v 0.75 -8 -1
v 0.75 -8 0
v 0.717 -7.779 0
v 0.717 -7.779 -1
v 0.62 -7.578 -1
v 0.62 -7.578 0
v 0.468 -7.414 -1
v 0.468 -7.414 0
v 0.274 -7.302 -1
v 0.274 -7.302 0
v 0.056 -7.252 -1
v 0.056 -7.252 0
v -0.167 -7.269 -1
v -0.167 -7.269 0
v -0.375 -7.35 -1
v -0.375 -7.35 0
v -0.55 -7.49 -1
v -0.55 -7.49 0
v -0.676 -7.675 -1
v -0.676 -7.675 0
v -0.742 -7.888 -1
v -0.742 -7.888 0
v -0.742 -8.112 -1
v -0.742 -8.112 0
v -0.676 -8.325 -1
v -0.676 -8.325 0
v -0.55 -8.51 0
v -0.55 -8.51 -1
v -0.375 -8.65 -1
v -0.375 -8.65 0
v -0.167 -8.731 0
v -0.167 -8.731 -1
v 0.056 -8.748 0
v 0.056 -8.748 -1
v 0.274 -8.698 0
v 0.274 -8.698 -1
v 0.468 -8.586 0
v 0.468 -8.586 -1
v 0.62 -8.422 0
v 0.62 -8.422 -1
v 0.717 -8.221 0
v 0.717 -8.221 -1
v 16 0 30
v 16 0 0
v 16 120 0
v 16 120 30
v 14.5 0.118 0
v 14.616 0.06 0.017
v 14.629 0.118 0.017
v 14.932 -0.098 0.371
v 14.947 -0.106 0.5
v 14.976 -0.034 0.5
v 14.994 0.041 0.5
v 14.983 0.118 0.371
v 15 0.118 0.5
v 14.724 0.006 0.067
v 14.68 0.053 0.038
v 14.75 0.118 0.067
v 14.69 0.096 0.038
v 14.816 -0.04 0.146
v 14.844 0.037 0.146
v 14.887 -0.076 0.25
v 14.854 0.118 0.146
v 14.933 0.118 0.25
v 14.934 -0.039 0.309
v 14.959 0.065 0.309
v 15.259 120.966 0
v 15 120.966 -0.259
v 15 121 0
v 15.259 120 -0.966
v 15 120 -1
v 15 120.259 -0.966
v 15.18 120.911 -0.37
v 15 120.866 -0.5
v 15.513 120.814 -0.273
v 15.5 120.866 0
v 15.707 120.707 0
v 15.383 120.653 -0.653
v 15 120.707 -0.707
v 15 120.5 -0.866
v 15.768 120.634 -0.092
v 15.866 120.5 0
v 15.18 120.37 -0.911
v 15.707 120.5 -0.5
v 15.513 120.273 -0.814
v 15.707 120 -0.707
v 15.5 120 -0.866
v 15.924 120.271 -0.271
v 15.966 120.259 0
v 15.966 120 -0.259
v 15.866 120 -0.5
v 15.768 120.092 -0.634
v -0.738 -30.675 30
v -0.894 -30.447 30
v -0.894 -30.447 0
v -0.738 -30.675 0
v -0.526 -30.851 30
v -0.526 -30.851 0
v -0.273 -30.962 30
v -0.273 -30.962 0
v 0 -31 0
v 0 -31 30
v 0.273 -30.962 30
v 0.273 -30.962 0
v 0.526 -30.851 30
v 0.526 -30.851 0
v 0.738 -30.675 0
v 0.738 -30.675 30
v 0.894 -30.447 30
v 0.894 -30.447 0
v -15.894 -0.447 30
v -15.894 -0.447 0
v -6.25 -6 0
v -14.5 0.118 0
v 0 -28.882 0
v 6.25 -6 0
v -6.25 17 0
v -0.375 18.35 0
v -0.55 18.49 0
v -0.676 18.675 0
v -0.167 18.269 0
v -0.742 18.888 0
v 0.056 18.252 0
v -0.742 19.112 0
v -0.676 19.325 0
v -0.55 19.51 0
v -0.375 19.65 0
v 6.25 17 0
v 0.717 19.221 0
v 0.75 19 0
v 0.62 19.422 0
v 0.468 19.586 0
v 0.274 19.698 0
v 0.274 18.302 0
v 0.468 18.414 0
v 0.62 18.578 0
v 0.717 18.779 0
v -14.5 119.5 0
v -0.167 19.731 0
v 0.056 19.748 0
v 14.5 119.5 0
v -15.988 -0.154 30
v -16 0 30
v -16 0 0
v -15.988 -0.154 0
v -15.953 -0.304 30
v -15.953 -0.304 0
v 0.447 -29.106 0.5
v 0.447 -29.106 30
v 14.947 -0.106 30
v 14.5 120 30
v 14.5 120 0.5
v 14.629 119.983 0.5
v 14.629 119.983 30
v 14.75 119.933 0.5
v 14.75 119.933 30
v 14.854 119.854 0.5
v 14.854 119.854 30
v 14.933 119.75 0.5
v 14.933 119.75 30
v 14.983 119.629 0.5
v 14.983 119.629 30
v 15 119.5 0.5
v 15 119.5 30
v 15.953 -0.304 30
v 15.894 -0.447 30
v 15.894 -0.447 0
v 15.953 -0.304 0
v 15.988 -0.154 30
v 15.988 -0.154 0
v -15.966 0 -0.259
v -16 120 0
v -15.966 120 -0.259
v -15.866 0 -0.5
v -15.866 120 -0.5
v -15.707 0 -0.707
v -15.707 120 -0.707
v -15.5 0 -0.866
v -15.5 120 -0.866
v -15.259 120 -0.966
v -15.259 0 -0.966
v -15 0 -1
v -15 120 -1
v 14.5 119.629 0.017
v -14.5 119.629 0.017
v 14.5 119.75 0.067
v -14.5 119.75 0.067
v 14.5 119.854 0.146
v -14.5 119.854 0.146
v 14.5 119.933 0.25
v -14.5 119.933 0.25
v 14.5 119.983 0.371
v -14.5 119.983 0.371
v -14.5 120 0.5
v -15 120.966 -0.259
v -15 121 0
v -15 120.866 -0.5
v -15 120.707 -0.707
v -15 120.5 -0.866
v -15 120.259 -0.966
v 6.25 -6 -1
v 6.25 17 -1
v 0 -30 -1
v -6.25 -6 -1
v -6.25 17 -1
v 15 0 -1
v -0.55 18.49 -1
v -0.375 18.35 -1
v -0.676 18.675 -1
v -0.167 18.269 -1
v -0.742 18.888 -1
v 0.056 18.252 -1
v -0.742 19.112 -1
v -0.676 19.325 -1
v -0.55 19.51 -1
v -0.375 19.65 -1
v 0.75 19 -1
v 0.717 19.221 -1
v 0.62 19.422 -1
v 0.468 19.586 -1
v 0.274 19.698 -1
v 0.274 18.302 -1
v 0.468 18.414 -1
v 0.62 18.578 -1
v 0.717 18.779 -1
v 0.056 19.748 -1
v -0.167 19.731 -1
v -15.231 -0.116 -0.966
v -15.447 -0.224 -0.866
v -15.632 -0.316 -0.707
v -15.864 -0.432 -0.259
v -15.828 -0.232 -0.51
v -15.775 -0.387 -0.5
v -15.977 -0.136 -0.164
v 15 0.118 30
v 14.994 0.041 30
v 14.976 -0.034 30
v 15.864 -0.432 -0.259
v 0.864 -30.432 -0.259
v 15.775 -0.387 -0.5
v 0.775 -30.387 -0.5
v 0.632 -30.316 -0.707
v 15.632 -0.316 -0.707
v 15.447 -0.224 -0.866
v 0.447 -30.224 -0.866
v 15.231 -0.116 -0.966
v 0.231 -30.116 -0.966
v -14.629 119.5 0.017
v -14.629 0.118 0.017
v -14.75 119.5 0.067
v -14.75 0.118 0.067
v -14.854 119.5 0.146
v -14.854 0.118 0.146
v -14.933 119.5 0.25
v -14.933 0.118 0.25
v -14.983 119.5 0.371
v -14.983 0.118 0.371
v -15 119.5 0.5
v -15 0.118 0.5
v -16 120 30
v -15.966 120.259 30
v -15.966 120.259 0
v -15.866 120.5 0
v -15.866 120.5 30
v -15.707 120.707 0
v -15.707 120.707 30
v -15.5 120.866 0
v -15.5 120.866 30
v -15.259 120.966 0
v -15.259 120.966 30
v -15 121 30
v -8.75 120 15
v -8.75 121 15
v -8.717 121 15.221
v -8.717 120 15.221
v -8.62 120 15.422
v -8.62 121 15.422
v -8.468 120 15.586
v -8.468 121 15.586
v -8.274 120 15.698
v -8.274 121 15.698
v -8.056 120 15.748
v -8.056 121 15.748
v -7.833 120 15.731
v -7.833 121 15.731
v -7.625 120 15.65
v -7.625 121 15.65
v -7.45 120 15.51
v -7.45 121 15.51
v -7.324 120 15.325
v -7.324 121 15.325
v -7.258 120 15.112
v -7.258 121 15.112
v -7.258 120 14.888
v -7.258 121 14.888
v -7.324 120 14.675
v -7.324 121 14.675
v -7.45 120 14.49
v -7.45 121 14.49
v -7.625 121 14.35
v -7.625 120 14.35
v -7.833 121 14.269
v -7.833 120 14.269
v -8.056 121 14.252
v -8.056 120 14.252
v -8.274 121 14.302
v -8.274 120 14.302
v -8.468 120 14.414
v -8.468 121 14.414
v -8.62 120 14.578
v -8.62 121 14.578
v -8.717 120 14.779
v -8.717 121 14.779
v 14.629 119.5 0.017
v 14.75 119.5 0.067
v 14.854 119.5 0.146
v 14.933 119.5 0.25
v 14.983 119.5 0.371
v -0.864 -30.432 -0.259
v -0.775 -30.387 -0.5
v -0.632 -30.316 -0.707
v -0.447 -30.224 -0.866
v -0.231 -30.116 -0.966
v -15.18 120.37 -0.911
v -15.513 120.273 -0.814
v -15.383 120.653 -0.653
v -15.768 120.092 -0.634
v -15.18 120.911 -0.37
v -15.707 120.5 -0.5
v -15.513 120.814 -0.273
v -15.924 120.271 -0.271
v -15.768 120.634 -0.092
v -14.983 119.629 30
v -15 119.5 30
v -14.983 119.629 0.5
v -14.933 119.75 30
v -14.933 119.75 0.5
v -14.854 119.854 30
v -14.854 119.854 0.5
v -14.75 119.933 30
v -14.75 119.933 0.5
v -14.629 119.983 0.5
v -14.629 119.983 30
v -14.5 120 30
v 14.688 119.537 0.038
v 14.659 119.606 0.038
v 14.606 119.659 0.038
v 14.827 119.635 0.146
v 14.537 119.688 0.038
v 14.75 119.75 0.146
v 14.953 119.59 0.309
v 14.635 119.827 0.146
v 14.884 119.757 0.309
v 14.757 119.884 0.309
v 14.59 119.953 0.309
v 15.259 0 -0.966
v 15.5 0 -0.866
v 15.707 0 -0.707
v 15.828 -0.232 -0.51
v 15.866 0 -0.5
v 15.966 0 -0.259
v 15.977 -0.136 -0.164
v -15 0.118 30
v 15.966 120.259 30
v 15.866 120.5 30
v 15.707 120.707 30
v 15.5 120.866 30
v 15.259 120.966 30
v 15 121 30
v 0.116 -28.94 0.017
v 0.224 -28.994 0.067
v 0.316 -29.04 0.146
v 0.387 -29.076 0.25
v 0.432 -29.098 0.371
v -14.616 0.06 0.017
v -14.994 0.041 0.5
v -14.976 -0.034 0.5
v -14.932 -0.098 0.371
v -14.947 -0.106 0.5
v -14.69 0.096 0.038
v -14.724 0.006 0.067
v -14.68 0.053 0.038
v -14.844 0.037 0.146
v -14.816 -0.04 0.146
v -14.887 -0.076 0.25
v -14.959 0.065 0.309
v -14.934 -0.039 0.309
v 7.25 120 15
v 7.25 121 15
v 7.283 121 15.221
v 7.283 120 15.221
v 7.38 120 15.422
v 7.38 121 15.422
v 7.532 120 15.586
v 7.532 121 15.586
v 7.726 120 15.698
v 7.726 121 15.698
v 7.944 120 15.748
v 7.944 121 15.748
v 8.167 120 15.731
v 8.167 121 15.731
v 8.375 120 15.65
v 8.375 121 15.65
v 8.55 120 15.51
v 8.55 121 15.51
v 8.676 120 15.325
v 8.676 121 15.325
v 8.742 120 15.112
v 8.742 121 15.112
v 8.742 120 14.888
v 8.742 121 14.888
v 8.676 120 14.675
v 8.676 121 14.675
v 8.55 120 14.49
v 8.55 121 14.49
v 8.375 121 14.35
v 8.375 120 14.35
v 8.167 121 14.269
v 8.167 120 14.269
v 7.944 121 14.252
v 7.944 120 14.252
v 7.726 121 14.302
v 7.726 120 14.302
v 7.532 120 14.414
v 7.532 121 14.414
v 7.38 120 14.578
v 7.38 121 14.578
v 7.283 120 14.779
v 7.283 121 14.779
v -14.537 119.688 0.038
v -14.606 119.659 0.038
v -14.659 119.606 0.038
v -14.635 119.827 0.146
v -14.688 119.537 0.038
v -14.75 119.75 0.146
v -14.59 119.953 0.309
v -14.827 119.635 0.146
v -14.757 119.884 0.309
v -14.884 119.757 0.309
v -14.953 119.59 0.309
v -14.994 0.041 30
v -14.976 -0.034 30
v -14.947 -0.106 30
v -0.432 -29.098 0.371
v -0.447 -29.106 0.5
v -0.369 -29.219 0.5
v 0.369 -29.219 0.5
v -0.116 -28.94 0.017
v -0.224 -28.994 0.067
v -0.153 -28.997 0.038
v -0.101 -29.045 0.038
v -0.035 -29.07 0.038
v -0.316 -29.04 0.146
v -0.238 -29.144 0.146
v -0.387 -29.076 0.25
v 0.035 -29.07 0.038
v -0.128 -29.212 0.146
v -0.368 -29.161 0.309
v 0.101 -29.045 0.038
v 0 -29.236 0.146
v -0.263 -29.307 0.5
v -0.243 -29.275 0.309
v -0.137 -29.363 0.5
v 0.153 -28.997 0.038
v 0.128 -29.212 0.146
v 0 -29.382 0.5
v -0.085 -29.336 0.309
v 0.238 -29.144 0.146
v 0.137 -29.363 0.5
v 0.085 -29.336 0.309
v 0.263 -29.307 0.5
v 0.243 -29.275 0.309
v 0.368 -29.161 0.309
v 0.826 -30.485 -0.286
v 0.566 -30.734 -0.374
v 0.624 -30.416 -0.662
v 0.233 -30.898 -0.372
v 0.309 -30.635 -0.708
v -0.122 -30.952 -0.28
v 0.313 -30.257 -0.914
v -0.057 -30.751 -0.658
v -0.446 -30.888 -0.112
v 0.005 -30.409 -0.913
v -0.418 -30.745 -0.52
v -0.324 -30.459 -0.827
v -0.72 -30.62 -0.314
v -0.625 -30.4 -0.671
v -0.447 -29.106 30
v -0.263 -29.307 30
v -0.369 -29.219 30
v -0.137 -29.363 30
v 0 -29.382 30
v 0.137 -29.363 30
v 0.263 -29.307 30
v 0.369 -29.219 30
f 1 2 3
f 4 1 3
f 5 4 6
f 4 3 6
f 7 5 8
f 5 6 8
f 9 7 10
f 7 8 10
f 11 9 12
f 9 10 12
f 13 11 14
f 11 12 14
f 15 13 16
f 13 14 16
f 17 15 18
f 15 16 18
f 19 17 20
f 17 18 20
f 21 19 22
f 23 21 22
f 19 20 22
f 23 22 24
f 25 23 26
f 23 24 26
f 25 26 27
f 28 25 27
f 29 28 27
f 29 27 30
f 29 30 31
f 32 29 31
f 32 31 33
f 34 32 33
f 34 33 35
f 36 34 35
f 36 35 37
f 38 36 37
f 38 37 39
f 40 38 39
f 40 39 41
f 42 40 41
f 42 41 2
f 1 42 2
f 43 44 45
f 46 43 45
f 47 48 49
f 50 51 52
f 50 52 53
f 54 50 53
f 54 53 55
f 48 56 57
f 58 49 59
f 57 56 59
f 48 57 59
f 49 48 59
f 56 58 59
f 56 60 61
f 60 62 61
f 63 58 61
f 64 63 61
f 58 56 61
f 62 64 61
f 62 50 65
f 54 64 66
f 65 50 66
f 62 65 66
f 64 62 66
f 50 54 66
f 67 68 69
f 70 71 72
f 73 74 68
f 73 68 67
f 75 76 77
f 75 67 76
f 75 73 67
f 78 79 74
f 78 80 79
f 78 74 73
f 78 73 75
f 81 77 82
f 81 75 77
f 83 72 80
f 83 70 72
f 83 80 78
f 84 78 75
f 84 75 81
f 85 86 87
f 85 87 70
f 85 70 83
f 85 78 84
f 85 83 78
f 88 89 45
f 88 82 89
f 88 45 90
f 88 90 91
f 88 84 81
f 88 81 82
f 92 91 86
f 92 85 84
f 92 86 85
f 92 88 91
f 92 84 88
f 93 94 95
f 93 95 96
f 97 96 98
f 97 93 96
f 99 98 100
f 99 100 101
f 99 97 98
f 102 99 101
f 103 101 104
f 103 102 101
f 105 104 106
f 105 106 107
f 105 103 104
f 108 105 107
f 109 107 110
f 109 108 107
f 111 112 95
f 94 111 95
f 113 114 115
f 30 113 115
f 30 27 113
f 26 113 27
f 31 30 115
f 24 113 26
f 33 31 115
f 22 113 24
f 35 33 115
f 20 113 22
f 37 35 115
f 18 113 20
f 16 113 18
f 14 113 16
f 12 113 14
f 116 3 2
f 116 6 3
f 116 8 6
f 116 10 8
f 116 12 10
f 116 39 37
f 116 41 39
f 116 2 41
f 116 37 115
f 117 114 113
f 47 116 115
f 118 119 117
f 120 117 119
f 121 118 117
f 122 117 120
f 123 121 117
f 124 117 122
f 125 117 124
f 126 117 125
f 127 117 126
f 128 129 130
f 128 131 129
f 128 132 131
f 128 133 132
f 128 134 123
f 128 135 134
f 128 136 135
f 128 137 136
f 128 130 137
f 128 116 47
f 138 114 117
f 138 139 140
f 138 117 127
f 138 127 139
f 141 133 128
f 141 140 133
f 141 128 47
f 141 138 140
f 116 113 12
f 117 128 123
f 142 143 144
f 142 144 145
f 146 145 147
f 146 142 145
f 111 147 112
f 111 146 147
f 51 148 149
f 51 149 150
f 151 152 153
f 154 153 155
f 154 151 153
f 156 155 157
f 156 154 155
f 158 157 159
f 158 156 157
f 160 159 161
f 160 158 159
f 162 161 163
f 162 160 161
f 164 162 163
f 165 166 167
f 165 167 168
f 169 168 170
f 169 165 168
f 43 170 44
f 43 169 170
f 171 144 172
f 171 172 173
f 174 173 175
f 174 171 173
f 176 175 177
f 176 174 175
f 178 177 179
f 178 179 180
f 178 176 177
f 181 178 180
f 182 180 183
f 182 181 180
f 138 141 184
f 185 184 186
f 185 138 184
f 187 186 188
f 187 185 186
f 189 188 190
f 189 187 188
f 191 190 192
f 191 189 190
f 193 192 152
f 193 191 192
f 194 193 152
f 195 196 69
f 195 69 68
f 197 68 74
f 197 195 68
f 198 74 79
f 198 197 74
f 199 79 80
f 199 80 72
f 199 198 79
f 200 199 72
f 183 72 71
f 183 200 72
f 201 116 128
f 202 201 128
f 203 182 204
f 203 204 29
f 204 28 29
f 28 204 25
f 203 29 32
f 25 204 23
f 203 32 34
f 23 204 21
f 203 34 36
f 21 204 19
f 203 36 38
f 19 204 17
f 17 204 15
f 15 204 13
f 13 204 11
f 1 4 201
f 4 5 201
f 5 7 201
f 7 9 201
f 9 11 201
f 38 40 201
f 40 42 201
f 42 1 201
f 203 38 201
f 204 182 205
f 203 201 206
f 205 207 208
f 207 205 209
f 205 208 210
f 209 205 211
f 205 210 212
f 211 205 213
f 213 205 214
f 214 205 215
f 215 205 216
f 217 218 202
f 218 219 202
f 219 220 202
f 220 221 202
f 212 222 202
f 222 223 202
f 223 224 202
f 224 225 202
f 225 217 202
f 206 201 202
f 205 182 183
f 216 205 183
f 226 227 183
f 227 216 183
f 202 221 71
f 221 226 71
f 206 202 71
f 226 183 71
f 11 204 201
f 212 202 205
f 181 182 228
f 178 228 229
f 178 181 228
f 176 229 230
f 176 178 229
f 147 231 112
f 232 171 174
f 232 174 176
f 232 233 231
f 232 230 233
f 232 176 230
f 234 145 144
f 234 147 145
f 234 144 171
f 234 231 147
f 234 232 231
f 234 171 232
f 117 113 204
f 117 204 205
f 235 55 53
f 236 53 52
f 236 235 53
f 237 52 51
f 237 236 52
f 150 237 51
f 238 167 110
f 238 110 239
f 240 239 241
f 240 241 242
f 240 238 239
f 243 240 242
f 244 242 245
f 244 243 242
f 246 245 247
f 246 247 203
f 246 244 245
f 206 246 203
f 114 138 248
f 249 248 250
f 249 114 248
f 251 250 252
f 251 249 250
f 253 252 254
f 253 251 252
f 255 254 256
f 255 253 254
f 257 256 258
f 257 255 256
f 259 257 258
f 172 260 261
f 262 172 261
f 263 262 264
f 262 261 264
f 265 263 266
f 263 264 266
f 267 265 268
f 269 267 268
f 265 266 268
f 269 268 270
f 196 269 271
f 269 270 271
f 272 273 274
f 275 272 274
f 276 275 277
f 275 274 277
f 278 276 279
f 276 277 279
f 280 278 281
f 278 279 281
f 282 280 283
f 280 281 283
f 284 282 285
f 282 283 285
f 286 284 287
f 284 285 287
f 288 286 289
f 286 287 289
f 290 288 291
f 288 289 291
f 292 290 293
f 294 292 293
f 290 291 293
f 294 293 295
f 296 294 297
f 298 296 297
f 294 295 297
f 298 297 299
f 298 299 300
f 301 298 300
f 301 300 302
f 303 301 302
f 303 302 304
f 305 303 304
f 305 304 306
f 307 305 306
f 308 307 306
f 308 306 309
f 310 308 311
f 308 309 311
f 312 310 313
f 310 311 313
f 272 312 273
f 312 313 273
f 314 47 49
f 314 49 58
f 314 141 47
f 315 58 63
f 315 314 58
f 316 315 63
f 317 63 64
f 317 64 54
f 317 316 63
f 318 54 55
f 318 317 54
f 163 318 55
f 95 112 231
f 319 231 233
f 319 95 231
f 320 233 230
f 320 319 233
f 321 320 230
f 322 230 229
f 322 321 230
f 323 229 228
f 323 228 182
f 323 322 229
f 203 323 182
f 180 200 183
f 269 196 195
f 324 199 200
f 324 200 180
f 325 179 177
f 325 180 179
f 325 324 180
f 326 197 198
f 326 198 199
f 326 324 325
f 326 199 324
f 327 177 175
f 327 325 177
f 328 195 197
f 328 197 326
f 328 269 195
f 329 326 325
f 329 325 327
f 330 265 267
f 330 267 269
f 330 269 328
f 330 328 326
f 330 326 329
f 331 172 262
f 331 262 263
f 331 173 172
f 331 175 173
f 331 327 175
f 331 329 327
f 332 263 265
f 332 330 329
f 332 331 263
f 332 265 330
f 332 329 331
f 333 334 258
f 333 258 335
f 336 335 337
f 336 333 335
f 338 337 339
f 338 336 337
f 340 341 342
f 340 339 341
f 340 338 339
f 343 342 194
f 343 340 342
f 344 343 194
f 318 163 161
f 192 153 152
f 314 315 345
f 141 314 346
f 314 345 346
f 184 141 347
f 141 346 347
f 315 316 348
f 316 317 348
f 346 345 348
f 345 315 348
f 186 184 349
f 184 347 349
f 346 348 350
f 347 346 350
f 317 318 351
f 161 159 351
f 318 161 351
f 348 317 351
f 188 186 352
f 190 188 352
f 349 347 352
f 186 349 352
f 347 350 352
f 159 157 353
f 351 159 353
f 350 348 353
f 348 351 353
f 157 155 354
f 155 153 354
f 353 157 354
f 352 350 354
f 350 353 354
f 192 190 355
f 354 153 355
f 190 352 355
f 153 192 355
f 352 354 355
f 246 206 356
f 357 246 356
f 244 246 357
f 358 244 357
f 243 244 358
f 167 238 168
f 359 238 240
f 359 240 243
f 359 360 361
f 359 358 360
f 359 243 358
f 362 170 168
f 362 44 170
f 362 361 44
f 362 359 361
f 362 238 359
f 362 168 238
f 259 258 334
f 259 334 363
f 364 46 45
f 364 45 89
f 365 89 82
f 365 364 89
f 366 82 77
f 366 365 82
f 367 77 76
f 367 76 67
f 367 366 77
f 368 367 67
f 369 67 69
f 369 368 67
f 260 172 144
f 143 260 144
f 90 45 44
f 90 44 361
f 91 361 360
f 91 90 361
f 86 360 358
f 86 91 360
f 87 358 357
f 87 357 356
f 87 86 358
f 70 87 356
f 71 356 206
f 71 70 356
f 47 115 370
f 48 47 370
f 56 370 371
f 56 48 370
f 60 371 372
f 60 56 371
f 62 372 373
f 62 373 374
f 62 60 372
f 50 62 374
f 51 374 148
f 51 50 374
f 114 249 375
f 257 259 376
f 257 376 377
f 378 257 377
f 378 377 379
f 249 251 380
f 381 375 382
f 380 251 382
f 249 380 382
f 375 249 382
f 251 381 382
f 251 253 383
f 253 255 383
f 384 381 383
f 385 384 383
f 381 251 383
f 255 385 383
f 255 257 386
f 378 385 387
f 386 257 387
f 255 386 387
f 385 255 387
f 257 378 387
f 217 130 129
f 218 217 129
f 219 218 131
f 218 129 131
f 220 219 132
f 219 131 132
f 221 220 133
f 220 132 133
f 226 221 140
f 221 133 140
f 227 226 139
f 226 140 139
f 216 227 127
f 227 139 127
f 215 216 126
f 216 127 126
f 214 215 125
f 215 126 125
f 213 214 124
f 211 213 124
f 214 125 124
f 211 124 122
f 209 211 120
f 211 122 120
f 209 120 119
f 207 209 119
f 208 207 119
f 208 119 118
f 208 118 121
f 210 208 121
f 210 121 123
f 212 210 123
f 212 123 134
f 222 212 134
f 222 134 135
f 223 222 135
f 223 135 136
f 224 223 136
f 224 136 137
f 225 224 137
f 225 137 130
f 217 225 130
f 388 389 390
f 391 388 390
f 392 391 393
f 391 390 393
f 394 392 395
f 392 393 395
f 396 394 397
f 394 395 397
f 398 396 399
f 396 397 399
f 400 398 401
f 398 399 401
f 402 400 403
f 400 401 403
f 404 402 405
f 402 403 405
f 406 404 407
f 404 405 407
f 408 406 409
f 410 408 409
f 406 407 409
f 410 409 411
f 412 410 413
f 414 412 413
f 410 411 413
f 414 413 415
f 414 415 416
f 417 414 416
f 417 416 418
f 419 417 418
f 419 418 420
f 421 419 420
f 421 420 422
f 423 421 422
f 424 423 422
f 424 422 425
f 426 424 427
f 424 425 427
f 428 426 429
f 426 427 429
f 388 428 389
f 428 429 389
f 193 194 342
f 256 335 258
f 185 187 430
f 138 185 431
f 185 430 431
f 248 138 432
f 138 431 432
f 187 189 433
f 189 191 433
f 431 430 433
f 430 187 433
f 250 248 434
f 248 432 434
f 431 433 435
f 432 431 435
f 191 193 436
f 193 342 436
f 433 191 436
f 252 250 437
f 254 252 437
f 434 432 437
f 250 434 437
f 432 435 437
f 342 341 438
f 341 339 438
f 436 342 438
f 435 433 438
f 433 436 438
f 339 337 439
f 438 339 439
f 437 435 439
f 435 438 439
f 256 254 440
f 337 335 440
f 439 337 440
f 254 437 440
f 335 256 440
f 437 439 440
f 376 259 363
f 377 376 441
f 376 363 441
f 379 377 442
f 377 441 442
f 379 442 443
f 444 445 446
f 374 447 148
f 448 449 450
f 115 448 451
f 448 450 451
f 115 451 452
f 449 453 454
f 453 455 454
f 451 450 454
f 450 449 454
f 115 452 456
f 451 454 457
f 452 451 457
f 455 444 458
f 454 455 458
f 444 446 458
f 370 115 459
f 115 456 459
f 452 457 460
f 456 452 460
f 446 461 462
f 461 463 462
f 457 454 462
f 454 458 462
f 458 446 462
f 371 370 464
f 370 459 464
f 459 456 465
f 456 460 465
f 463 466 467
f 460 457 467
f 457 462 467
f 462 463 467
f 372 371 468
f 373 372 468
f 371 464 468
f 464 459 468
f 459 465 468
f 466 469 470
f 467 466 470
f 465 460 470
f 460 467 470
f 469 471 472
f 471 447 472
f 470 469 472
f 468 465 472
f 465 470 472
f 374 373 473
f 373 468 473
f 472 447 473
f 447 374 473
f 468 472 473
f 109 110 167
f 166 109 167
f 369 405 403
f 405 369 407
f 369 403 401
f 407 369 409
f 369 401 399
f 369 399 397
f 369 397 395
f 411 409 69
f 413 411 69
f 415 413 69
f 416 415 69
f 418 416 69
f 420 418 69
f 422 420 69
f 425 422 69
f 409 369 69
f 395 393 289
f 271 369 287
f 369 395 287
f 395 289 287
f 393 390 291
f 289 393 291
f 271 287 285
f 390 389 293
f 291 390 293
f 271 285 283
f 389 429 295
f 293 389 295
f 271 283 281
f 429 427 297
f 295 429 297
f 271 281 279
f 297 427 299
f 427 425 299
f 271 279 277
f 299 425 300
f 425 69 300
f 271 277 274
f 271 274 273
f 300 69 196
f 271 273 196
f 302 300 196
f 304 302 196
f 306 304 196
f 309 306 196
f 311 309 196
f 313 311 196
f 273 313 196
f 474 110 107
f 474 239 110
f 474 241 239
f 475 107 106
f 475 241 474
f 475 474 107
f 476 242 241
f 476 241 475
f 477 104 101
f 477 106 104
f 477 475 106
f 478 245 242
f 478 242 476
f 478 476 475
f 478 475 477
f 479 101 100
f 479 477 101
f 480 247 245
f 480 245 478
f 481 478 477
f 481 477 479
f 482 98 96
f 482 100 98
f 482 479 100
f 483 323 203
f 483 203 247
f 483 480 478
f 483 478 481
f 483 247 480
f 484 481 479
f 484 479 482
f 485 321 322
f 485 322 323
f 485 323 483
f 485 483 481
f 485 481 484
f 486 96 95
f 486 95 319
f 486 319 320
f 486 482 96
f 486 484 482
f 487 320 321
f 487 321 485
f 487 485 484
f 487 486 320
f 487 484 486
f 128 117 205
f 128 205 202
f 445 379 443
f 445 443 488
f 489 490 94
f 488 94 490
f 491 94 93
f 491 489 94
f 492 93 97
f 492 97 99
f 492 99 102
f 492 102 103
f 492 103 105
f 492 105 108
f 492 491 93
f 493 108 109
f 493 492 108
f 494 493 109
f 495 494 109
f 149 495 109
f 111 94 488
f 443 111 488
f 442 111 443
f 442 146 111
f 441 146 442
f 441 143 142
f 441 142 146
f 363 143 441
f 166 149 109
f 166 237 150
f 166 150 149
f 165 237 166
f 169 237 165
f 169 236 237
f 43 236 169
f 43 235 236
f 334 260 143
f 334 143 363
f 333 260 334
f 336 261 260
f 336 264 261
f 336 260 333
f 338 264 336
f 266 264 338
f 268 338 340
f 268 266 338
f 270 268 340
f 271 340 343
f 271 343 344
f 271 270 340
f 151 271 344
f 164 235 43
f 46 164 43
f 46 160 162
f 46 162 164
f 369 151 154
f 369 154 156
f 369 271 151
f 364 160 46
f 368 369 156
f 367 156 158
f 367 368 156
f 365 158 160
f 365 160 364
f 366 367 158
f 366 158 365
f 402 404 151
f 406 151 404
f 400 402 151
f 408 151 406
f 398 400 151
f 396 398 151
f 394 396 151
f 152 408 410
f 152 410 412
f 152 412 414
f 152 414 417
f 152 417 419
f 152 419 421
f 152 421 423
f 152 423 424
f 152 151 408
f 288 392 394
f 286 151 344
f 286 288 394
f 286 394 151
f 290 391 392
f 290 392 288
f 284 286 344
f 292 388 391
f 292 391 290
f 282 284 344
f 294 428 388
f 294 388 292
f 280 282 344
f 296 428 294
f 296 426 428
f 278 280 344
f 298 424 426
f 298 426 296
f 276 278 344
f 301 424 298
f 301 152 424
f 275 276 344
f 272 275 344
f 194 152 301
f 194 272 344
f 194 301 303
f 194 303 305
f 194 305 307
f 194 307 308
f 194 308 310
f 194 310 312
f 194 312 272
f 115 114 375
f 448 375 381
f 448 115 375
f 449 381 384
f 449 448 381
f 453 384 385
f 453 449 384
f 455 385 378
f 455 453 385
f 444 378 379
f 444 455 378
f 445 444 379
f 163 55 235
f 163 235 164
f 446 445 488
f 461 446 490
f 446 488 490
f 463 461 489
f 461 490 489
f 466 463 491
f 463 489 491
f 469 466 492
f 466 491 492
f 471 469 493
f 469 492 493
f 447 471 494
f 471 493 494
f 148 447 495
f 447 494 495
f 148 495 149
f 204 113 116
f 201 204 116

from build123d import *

# Parameters (mm, degrees)
PAD_DEPTH       = 30
THICKNESS_T     = 1
SKETCH001_R     = 0.75
SKETCH001_W     = 12.5
SKETCH001_H     = 23
POCKET_DEPTH    = 5
SKETCH002_R     = 0.75
POCKET001_DEPTH = 1
FILLET001_R     = 0.5
FILLET_R        = 0.5


with BuildPart() as part:
    # Sketch → Pad (new body)
    with BuildSketch(Plane.XY):
        Polygon((-15, 120), (-15, 0), (0, -30), (15, 0), (15, 120), align=None)
    extrude(amount=PAD_DEPTH)

    # Thickness
    thickness_openings = [part.faces().sort_by_distance(p)[0] for p in [
        (0, 52.222222, 30),
    ]]
    offset(amount=THICKNESS_T, openings=thickness_openings)

    # Sketch001 (on Face6 of Thickness) → Pocket (cut)
    with BuildSketch(Plane.XY):
        with Locations((0, 19)):
            Circle(SKETCH001_R)
        with Locations((0, -8)):
            Circle(SKETCH001_R)
        with Locations((0, 5.5)):
            Rectangle(SKETCH001_W, SKETCH001_H)
    extrude(amount=-POCKET_DEPTH, mode=Mode.SUBTRACT)

    # Sketch002 (on Face15 of Pocket) → Pocket001 (cut)
    with BuildSketch(Plane(origin=(0, 121, 0), x_dir=(-1, 0, 0), z_dir=(0, 1, 0))):
        with Locations((-8, 15)):
            Circle(SKETCH002_R)
        with Locations((8, 15)):
            Circle(SKETCH002_R)
    extrude(amount=-POCKET001_DEPTH, mode=Mode.SUBTRACT)

    # Fillet001
    fillet001_edges = [part.edges().sort_by_distance(p)[0] for p in [
        (0, -30, 15),
        (15, 0, 15),
        (-15, 0, 15),
        (-15, 120, 15),
        (15, 120, 15),
    ]]
    fillet(fillet001_edges, radius=FILLET001_R)

    # Fillet
    fillet_edges = [part.edges().sort_by_distance(p)[0] for p in [
        (7.697214, -14.605573, 0),
        (0, -29.381966, 0),
        (-7.697214, -14.605573, 0),
        (15, 59.809017, 0),
        (14.986624, 0.003158, 0),
        (-14.986624, 0.003158, 0),
        (-15, 59.809017, 0),
        (0, 120, 0),
        (14.853553, 119.853553, 0),
        (-14.853553, 119.853553, 0),
    ]]
    fillet(fillet_edges, radius=FILLET_R)


solid = part.part
